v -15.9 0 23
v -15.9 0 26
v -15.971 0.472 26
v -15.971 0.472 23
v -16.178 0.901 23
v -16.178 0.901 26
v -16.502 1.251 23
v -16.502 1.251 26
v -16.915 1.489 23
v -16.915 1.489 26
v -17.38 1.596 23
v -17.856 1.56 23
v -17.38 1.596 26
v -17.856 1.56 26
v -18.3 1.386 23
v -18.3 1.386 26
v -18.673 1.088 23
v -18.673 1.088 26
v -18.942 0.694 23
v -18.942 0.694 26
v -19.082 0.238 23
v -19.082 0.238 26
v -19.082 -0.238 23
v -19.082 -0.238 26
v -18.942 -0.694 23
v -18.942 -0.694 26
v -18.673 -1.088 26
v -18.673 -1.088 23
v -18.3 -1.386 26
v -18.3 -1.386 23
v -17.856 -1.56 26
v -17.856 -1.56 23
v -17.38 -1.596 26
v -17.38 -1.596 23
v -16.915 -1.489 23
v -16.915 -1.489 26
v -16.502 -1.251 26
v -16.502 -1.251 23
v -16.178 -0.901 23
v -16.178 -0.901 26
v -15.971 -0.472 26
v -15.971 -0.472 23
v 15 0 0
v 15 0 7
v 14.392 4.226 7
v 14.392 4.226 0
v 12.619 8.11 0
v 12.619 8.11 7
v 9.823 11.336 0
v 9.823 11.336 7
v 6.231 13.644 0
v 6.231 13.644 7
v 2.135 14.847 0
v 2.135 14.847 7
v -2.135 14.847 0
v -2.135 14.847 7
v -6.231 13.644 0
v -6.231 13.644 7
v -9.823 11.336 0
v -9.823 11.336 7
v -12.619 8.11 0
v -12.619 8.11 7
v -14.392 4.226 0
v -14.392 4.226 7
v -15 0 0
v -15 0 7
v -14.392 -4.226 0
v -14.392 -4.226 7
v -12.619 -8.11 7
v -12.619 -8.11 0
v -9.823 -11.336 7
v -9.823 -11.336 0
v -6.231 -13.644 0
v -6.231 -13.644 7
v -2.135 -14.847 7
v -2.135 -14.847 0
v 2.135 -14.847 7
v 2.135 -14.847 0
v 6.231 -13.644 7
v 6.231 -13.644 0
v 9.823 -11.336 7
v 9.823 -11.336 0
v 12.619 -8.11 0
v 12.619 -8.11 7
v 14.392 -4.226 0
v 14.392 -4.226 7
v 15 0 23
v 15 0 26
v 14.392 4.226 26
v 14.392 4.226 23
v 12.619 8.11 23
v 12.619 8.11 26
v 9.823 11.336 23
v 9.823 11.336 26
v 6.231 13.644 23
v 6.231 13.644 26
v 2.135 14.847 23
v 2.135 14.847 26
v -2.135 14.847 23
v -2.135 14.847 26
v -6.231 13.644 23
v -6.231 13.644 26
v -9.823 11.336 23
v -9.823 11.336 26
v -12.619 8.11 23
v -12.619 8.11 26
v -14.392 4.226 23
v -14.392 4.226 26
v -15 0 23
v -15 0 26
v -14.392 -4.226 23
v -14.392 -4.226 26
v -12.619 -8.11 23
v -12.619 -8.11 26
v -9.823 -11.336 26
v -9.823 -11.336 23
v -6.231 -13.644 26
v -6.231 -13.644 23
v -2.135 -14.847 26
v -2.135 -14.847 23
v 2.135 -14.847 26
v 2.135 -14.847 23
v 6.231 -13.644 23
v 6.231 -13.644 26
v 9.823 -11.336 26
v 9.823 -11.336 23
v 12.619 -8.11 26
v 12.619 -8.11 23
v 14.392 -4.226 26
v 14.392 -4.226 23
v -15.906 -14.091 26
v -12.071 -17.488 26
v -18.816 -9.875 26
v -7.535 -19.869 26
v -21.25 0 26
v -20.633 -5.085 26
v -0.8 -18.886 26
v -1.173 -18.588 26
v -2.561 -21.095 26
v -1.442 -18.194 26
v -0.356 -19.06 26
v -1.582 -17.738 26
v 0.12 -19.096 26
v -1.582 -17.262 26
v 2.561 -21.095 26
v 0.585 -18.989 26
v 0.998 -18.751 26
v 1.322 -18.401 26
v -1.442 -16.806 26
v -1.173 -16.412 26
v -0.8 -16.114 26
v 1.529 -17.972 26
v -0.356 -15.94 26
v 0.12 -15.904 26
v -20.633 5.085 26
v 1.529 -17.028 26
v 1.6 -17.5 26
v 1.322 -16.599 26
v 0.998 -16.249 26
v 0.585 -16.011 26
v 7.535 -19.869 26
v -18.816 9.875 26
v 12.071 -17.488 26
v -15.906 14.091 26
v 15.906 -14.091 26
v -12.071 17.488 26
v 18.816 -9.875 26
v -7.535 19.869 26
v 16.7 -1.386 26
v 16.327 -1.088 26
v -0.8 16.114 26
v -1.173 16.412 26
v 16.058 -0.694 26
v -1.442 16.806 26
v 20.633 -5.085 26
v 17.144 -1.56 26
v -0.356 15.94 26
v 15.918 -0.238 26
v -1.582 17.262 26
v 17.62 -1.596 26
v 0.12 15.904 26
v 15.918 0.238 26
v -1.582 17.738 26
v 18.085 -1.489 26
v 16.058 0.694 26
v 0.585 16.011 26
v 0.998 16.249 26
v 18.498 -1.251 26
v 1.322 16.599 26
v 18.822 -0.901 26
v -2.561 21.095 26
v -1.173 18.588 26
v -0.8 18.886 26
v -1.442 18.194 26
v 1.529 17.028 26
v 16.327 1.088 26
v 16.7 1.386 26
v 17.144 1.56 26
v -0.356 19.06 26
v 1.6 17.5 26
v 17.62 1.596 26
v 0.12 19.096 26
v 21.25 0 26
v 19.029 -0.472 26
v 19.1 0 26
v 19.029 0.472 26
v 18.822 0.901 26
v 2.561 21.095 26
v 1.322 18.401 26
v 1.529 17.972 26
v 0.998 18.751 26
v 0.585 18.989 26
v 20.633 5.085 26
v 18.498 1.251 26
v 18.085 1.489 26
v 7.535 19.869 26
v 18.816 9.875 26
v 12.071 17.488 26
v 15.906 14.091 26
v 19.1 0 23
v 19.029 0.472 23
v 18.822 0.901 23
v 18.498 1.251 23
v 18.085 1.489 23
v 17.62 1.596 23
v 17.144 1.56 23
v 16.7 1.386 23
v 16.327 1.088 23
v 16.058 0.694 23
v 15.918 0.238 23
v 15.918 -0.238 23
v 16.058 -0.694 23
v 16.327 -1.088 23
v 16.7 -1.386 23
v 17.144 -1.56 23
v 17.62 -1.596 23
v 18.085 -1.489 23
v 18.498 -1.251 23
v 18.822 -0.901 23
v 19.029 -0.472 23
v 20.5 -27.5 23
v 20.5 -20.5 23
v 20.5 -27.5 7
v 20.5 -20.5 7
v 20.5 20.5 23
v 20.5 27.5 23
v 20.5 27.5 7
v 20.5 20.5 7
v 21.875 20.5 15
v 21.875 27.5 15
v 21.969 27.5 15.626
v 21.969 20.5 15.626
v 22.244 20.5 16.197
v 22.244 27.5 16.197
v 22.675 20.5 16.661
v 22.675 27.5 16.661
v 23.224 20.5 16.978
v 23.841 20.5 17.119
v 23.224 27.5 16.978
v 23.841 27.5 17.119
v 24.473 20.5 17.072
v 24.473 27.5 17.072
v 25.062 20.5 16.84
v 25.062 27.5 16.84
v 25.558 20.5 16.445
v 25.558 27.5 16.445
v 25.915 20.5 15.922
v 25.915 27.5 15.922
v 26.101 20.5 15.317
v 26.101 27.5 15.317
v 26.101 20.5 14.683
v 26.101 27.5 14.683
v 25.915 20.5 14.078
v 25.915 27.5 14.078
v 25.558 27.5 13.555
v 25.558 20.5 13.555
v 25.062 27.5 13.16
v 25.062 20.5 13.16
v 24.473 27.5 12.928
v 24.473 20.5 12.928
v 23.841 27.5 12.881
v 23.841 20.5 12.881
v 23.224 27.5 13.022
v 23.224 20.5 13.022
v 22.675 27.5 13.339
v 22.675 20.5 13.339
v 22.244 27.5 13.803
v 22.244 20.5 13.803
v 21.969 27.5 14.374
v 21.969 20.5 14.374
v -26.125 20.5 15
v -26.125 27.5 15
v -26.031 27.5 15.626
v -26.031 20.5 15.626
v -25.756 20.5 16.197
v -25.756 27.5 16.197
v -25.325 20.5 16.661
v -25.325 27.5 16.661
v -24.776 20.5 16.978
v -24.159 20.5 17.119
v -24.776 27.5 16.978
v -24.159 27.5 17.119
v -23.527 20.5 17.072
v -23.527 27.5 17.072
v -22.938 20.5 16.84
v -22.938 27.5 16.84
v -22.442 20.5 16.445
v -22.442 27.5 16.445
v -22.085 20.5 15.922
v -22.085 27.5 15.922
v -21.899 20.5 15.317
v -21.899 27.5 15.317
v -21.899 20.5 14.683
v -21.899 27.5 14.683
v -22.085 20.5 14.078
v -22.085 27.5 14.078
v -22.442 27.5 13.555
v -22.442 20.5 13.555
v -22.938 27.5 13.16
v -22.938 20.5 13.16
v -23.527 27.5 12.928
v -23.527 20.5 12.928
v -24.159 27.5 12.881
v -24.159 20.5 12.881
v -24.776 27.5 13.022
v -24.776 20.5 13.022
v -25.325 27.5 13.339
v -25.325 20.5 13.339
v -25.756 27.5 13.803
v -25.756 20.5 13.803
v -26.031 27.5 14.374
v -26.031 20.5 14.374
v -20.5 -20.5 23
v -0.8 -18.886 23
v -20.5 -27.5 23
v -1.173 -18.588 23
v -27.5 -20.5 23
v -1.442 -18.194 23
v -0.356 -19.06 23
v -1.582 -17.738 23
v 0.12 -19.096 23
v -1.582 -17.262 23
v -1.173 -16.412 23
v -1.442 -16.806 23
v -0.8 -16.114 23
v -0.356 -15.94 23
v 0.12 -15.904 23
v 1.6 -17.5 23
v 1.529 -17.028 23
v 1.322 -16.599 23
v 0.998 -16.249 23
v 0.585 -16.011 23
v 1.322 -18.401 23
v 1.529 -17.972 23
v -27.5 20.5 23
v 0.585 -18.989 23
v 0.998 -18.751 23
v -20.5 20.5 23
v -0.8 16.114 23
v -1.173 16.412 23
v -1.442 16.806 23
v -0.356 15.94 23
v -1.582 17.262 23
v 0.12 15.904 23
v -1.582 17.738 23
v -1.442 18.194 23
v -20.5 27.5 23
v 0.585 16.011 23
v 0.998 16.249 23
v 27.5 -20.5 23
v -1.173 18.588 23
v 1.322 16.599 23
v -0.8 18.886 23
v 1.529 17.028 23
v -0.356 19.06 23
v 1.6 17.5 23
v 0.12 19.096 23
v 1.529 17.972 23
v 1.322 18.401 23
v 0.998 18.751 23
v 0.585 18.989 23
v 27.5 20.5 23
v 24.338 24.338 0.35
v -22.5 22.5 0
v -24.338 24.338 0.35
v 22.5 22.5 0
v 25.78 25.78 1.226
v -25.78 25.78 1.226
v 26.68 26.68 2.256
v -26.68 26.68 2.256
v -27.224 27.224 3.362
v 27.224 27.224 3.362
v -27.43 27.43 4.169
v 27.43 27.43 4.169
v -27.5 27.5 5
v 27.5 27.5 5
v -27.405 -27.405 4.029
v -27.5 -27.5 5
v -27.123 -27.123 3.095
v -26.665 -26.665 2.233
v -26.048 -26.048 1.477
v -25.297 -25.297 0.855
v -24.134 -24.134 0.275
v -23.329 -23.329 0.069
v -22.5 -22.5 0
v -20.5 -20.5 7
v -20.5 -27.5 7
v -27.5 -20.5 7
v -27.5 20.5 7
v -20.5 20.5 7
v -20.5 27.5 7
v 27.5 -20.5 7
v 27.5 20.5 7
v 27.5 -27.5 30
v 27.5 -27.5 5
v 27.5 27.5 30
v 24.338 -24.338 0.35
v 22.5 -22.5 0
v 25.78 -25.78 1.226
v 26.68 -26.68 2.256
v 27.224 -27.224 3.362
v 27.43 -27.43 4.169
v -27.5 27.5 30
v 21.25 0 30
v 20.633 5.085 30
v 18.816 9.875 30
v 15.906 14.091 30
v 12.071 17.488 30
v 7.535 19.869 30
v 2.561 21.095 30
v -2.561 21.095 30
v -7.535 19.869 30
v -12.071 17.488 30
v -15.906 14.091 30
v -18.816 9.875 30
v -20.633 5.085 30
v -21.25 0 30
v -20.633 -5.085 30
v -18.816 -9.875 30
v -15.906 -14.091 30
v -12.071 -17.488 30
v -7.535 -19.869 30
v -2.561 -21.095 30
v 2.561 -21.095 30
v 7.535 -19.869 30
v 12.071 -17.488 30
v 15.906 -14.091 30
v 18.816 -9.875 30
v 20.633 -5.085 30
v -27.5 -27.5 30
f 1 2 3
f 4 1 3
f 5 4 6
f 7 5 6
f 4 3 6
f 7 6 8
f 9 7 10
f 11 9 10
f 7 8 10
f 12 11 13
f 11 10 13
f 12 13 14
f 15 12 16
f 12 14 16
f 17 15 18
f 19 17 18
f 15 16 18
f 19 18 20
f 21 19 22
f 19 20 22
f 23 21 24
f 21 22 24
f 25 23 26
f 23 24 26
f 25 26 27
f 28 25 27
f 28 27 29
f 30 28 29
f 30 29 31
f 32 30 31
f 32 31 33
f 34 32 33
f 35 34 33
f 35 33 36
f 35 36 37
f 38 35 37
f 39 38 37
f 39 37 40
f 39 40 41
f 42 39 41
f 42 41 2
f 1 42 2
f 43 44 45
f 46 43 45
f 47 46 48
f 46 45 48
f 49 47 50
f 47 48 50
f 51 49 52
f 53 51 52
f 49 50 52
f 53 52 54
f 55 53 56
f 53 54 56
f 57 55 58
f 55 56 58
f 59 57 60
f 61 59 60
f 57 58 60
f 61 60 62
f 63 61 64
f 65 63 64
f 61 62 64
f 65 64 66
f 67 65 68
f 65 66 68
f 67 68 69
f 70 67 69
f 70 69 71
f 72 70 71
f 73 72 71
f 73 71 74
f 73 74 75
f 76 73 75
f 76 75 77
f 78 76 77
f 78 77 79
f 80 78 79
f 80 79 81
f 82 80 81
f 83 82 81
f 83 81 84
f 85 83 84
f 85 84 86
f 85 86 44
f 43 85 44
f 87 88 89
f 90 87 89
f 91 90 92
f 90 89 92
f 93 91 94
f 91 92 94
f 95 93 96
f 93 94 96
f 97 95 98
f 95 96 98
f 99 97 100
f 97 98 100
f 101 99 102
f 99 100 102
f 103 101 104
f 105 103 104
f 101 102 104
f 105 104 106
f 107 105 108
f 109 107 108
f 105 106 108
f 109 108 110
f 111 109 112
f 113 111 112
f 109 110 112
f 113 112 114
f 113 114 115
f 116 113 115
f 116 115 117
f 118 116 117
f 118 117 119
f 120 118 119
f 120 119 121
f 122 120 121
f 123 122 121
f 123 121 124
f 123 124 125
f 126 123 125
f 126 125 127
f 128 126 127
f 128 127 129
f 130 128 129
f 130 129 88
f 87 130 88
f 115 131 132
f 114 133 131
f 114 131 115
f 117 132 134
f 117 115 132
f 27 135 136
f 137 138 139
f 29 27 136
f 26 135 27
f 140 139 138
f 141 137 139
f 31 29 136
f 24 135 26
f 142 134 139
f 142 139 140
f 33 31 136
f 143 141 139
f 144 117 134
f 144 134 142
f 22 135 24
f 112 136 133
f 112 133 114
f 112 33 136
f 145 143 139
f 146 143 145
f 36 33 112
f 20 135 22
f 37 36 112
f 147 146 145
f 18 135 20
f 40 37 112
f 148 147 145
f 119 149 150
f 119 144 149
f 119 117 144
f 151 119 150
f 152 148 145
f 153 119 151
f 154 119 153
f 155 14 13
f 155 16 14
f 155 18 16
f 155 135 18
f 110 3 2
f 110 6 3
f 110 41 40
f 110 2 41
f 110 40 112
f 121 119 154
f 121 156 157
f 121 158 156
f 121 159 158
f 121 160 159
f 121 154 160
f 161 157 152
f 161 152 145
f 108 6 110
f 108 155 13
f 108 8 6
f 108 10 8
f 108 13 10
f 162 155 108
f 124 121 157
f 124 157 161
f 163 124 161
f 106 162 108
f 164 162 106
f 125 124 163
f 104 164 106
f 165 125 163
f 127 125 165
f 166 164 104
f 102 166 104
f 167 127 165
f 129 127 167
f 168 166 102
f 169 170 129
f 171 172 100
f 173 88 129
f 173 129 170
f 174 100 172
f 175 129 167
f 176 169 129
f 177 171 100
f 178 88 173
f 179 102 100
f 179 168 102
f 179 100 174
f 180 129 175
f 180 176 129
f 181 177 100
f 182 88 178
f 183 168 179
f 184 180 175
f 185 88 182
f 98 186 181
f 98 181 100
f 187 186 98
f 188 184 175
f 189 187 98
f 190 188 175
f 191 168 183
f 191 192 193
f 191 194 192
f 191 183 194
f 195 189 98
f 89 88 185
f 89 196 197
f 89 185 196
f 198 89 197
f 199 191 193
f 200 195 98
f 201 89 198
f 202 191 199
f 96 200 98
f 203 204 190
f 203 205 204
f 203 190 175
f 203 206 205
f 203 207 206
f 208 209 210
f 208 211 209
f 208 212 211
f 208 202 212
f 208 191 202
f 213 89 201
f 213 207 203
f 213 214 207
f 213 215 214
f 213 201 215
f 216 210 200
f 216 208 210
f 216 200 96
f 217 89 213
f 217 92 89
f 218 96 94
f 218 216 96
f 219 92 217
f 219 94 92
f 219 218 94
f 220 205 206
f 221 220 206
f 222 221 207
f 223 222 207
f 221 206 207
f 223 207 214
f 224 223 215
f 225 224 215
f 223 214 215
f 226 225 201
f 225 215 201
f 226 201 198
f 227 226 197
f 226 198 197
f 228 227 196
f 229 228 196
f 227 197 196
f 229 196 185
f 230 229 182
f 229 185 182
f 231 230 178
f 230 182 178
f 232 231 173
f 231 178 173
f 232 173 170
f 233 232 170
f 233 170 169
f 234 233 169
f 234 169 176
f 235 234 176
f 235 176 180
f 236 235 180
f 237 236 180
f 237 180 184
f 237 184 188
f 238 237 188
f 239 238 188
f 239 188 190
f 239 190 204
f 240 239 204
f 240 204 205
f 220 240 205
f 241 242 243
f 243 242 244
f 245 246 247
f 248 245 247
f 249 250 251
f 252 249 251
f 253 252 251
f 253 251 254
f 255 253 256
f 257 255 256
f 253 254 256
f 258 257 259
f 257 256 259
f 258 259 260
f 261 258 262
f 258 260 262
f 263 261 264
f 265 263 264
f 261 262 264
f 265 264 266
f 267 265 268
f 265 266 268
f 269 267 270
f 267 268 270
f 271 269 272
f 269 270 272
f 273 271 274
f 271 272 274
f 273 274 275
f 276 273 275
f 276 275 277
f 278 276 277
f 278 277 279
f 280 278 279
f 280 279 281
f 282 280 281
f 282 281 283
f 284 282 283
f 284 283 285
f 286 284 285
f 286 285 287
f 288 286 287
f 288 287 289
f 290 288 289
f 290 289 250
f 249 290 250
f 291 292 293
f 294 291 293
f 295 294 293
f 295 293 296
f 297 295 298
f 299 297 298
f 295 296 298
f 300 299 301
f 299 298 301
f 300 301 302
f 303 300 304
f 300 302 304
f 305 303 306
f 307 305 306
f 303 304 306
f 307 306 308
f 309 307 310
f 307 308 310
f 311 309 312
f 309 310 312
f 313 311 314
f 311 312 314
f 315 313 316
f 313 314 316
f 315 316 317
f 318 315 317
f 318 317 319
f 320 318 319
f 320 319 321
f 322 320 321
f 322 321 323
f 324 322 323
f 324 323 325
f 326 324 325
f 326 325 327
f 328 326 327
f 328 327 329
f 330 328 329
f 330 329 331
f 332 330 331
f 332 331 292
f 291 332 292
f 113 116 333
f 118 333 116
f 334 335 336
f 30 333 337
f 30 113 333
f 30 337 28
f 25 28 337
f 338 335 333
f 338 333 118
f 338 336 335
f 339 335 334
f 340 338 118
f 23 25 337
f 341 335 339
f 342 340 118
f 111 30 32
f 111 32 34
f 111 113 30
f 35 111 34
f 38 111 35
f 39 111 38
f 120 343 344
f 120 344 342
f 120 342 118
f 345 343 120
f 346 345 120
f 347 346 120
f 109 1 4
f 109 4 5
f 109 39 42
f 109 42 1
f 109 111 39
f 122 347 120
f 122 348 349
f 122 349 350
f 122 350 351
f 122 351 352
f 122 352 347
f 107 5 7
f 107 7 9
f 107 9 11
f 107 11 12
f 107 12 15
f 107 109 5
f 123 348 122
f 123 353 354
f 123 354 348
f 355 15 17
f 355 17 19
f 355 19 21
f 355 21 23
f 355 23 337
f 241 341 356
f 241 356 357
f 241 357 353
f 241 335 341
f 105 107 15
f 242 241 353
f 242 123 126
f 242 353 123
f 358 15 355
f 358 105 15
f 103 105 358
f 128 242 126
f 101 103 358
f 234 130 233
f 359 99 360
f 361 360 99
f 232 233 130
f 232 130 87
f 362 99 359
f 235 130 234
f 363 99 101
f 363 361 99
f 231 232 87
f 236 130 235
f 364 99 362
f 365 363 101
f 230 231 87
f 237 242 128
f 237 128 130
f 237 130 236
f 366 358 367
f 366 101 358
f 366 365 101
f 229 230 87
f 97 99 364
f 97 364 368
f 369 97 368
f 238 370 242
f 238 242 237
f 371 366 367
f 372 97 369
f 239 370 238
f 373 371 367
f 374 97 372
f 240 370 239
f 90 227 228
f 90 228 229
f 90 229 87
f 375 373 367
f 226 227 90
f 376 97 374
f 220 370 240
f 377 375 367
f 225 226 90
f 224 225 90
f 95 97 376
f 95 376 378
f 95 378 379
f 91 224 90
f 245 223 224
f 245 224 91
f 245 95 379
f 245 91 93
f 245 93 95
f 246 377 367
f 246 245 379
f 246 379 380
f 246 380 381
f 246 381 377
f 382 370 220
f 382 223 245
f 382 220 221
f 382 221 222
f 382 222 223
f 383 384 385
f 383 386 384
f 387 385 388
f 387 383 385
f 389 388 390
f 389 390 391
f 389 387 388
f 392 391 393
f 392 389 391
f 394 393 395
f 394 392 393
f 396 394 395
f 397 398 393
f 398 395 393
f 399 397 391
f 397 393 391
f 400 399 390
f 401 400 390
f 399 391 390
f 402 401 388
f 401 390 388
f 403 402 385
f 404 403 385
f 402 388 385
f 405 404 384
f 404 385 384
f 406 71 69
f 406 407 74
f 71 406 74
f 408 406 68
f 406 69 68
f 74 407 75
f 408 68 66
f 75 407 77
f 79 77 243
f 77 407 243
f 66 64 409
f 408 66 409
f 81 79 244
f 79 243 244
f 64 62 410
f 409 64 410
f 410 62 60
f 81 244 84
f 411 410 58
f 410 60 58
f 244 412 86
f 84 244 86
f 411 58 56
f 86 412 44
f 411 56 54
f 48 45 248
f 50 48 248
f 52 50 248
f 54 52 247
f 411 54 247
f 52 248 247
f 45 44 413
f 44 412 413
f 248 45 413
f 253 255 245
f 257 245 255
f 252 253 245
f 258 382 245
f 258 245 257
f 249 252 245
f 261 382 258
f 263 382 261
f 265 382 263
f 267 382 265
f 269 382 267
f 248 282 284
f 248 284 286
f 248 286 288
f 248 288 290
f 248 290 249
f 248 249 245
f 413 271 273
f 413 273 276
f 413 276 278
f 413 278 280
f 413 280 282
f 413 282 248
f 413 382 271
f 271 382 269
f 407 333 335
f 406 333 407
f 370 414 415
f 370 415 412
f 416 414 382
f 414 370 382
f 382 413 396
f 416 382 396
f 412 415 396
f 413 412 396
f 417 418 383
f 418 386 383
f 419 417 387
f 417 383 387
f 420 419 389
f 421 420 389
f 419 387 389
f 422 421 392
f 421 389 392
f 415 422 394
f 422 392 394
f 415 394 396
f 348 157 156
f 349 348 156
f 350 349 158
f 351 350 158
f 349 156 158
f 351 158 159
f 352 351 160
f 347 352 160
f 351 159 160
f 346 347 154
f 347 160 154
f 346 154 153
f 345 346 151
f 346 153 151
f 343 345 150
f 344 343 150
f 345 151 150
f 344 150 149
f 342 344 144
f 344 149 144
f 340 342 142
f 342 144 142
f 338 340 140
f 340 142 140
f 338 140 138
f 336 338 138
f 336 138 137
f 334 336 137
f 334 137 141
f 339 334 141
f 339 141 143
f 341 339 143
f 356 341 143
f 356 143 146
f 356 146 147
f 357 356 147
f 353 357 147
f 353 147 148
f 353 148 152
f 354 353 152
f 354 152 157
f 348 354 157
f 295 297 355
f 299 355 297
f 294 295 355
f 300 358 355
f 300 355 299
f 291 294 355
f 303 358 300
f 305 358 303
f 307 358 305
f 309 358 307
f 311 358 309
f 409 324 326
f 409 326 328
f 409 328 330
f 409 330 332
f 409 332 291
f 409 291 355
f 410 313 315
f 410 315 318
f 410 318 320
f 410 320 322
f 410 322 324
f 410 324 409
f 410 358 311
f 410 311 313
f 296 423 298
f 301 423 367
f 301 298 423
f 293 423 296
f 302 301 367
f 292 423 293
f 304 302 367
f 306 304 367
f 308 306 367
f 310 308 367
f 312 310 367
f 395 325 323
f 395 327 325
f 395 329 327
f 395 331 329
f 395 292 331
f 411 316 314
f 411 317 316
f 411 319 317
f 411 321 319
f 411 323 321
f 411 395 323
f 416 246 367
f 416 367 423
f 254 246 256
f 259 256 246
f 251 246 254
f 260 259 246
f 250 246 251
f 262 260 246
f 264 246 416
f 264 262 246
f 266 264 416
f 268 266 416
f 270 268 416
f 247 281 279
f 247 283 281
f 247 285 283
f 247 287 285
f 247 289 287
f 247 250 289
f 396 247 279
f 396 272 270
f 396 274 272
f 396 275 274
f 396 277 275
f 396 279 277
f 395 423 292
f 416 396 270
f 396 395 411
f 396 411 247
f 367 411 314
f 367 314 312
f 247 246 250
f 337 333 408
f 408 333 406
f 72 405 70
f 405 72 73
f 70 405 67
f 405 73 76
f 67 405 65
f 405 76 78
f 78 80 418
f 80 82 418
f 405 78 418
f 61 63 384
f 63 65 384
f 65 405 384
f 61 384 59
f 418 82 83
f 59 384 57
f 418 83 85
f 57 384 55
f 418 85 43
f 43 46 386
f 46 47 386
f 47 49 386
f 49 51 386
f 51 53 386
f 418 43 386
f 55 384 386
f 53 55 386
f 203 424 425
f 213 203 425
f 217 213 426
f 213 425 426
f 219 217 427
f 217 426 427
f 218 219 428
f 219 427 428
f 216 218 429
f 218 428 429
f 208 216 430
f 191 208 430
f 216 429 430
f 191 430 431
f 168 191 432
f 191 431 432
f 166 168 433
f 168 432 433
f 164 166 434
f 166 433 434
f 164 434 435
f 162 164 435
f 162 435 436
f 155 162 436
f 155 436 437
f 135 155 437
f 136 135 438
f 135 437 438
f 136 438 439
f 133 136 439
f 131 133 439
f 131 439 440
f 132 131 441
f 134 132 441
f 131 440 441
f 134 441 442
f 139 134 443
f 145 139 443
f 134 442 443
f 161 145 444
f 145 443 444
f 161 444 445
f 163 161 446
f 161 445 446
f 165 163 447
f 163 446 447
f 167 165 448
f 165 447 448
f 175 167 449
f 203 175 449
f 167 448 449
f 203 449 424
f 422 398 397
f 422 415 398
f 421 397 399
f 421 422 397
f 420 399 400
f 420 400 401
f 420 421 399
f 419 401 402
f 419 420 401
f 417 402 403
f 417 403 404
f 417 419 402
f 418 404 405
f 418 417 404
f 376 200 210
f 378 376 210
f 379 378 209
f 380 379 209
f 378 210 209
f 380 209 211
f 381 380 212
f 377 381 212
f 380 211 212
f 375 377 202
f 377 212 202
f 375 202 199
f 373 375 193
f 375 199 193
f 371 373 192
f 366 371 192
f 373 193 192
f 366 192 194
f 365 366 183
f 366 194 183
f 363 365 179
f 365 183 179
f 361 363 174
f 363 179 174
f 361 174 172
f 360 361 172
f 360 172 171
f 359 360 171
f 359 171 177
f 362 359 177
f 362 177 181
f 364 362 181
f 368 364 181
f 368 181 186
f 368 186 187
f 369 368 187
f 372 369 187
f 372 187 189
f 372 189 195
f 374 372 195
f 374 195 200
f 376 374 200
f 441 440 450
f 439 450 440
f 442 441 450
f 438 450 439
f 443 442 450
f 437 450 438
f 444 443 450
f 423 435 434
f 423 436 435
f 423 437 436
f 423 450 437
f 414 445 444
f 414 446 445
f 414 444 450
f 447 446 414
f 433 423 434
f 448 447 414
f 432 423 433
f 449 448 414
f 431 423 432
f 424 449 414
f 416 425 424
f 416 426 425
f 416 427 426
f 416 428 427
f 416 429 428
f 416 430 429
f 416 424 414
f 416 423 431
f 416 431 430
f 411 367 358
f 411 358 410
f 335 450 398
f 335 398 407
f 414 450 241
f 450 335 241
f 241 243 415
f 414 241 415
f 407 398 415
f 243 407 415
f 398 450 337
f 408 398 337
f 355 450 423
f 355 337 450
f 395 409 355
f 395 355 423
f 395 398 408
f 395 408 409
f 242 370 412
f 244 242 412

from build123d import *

# Parameters (mm, degrees)
SKETCH1_W           = 55
SKETCH1_H           = 55
BOSS_EXTRUDE1_DEPTH = 30
SKETCH4_W           = 41
SKETCH4_H           = 16
CUT_EXTRUDE1_DEPTH  = 69.419660917
SKETCH5_W           = 16
SKETCH5_H           = 41
CUT_EXTRUDE2_DEPTH  = 60
SKETCH7_R           = 21.25
CUT_EXTRUDE3_DEPTH  = 4
SKETCH8_R           = 15
CUT_EXTRUDE4_DEPTH  = 50
SKETCH9_R           = 1.6
CUT_EXTRUDE5_DEPTH  = 10
SKETCH11_R          = 2.125
CUT_EXTRUDE6_DEPTH  = 10
FILLET2_R           = 5


with BuildPart() as part:
    # Sketch1 → Boss-Extrude1 (new body)
    with BuildSketch(Plane.XY):
        Rectangle(SKETCH1_W, SKETCH1_H)
    extrude(amount=BOSS_EXTRUDE1_DEPTH)

    # Sketch4 → Cut-Extrude1 (cut, through all)
    with BuildSketch(Plane(origin=(0, 27.5, 0), x_dir=(1, 0, 0), z_dir=(0, 1, 0))):
        with Locations((0, -15)):
            Rectangle(SKETCH4_W, SKETCH4_H)
    extrude(amount=-CUT_EXTRUDE1_DEPTH, mode=Mode.SUBTRACT)

    # Sketch5 → Cut-Extrude2 (cut)
    with BuildSketch(Plane(origin=(27.5, 0, 0), x_dir=(0, 0, -1), z_dir=(1, 0, 0))):
        with Locations((-15, 0)):
            Rectangle(SKETCH5_W, SKETCH5_H)
    extrude(amount=-CUT_EXTRUDE2_DEPTH, mode=Mode.SUBTRACT)

    # Sketch7 → Cut-Extrude3 (cut)
    with BuildSketch(Plane.XY.offset(30)):
        Circle(SKETCH7_R)
    extrude(amount=-CUT_EXTRUDE3_DEPTH, mode=Mode.SUBTRACT)

    # Sketch8 → Cut-Extrude4 (cut)
    with BuildSketch(Plane.XY.offset(26)):
        Circle(SKETCH8_R)
    extrude(amount=-CUT_EXTRUDE4_DEPTH, mode=Mode.SUBTRACT)

    # Sketch9 → Cut-Extrude5 (cut)
    with BuildSketch(Plane.XY.offset(26)):
        with Locations((0, 17.5)):
            Circle(SKETCH9_R)
        with Locations((17.5, 0)):
            Circle(SKETCH9_R)
        with Locations((0, -17.5)):
            Circle(SKETCH9_R)
        with Locations((-17.5, 0)):
            Circle(SKETCH9_R)
    extrude(amount=-CUT_EXTRUDE5_DEPTH, mode=Mode.SUBTRACT)

    # Sketch11 → Cut-Extrude6 (cut)
    with BuildSketch(Plane(origin=(0, 27.5, 0), x_dir=(1, 0, 0), z_dir=(0, 1, 0))):
        with Locations(Location((-24, -15, 0), (0, 0, 180))):
            Circle(SKETCH11_R)
        with Locations(Location((24, -15, 0), (0, 0, 180))):
            Circle(SKETCH11_R)
    extrude(amount=-CUT_EXTRUDE6_DEPTH, mode=Mode.SUBTRACT)

    # Fillet2
    fillet2_edges = [part.edges().sort_by_distance(p)[0] for p in [
        (0, 27.5, 0),
        (27.5, 0, 0),
        (0, -27.5, 0),
        (-27.5, 0, 0),
    ]]
    fillet(fillet2_edges, radius=FILLET2_R)


solid = part.part
